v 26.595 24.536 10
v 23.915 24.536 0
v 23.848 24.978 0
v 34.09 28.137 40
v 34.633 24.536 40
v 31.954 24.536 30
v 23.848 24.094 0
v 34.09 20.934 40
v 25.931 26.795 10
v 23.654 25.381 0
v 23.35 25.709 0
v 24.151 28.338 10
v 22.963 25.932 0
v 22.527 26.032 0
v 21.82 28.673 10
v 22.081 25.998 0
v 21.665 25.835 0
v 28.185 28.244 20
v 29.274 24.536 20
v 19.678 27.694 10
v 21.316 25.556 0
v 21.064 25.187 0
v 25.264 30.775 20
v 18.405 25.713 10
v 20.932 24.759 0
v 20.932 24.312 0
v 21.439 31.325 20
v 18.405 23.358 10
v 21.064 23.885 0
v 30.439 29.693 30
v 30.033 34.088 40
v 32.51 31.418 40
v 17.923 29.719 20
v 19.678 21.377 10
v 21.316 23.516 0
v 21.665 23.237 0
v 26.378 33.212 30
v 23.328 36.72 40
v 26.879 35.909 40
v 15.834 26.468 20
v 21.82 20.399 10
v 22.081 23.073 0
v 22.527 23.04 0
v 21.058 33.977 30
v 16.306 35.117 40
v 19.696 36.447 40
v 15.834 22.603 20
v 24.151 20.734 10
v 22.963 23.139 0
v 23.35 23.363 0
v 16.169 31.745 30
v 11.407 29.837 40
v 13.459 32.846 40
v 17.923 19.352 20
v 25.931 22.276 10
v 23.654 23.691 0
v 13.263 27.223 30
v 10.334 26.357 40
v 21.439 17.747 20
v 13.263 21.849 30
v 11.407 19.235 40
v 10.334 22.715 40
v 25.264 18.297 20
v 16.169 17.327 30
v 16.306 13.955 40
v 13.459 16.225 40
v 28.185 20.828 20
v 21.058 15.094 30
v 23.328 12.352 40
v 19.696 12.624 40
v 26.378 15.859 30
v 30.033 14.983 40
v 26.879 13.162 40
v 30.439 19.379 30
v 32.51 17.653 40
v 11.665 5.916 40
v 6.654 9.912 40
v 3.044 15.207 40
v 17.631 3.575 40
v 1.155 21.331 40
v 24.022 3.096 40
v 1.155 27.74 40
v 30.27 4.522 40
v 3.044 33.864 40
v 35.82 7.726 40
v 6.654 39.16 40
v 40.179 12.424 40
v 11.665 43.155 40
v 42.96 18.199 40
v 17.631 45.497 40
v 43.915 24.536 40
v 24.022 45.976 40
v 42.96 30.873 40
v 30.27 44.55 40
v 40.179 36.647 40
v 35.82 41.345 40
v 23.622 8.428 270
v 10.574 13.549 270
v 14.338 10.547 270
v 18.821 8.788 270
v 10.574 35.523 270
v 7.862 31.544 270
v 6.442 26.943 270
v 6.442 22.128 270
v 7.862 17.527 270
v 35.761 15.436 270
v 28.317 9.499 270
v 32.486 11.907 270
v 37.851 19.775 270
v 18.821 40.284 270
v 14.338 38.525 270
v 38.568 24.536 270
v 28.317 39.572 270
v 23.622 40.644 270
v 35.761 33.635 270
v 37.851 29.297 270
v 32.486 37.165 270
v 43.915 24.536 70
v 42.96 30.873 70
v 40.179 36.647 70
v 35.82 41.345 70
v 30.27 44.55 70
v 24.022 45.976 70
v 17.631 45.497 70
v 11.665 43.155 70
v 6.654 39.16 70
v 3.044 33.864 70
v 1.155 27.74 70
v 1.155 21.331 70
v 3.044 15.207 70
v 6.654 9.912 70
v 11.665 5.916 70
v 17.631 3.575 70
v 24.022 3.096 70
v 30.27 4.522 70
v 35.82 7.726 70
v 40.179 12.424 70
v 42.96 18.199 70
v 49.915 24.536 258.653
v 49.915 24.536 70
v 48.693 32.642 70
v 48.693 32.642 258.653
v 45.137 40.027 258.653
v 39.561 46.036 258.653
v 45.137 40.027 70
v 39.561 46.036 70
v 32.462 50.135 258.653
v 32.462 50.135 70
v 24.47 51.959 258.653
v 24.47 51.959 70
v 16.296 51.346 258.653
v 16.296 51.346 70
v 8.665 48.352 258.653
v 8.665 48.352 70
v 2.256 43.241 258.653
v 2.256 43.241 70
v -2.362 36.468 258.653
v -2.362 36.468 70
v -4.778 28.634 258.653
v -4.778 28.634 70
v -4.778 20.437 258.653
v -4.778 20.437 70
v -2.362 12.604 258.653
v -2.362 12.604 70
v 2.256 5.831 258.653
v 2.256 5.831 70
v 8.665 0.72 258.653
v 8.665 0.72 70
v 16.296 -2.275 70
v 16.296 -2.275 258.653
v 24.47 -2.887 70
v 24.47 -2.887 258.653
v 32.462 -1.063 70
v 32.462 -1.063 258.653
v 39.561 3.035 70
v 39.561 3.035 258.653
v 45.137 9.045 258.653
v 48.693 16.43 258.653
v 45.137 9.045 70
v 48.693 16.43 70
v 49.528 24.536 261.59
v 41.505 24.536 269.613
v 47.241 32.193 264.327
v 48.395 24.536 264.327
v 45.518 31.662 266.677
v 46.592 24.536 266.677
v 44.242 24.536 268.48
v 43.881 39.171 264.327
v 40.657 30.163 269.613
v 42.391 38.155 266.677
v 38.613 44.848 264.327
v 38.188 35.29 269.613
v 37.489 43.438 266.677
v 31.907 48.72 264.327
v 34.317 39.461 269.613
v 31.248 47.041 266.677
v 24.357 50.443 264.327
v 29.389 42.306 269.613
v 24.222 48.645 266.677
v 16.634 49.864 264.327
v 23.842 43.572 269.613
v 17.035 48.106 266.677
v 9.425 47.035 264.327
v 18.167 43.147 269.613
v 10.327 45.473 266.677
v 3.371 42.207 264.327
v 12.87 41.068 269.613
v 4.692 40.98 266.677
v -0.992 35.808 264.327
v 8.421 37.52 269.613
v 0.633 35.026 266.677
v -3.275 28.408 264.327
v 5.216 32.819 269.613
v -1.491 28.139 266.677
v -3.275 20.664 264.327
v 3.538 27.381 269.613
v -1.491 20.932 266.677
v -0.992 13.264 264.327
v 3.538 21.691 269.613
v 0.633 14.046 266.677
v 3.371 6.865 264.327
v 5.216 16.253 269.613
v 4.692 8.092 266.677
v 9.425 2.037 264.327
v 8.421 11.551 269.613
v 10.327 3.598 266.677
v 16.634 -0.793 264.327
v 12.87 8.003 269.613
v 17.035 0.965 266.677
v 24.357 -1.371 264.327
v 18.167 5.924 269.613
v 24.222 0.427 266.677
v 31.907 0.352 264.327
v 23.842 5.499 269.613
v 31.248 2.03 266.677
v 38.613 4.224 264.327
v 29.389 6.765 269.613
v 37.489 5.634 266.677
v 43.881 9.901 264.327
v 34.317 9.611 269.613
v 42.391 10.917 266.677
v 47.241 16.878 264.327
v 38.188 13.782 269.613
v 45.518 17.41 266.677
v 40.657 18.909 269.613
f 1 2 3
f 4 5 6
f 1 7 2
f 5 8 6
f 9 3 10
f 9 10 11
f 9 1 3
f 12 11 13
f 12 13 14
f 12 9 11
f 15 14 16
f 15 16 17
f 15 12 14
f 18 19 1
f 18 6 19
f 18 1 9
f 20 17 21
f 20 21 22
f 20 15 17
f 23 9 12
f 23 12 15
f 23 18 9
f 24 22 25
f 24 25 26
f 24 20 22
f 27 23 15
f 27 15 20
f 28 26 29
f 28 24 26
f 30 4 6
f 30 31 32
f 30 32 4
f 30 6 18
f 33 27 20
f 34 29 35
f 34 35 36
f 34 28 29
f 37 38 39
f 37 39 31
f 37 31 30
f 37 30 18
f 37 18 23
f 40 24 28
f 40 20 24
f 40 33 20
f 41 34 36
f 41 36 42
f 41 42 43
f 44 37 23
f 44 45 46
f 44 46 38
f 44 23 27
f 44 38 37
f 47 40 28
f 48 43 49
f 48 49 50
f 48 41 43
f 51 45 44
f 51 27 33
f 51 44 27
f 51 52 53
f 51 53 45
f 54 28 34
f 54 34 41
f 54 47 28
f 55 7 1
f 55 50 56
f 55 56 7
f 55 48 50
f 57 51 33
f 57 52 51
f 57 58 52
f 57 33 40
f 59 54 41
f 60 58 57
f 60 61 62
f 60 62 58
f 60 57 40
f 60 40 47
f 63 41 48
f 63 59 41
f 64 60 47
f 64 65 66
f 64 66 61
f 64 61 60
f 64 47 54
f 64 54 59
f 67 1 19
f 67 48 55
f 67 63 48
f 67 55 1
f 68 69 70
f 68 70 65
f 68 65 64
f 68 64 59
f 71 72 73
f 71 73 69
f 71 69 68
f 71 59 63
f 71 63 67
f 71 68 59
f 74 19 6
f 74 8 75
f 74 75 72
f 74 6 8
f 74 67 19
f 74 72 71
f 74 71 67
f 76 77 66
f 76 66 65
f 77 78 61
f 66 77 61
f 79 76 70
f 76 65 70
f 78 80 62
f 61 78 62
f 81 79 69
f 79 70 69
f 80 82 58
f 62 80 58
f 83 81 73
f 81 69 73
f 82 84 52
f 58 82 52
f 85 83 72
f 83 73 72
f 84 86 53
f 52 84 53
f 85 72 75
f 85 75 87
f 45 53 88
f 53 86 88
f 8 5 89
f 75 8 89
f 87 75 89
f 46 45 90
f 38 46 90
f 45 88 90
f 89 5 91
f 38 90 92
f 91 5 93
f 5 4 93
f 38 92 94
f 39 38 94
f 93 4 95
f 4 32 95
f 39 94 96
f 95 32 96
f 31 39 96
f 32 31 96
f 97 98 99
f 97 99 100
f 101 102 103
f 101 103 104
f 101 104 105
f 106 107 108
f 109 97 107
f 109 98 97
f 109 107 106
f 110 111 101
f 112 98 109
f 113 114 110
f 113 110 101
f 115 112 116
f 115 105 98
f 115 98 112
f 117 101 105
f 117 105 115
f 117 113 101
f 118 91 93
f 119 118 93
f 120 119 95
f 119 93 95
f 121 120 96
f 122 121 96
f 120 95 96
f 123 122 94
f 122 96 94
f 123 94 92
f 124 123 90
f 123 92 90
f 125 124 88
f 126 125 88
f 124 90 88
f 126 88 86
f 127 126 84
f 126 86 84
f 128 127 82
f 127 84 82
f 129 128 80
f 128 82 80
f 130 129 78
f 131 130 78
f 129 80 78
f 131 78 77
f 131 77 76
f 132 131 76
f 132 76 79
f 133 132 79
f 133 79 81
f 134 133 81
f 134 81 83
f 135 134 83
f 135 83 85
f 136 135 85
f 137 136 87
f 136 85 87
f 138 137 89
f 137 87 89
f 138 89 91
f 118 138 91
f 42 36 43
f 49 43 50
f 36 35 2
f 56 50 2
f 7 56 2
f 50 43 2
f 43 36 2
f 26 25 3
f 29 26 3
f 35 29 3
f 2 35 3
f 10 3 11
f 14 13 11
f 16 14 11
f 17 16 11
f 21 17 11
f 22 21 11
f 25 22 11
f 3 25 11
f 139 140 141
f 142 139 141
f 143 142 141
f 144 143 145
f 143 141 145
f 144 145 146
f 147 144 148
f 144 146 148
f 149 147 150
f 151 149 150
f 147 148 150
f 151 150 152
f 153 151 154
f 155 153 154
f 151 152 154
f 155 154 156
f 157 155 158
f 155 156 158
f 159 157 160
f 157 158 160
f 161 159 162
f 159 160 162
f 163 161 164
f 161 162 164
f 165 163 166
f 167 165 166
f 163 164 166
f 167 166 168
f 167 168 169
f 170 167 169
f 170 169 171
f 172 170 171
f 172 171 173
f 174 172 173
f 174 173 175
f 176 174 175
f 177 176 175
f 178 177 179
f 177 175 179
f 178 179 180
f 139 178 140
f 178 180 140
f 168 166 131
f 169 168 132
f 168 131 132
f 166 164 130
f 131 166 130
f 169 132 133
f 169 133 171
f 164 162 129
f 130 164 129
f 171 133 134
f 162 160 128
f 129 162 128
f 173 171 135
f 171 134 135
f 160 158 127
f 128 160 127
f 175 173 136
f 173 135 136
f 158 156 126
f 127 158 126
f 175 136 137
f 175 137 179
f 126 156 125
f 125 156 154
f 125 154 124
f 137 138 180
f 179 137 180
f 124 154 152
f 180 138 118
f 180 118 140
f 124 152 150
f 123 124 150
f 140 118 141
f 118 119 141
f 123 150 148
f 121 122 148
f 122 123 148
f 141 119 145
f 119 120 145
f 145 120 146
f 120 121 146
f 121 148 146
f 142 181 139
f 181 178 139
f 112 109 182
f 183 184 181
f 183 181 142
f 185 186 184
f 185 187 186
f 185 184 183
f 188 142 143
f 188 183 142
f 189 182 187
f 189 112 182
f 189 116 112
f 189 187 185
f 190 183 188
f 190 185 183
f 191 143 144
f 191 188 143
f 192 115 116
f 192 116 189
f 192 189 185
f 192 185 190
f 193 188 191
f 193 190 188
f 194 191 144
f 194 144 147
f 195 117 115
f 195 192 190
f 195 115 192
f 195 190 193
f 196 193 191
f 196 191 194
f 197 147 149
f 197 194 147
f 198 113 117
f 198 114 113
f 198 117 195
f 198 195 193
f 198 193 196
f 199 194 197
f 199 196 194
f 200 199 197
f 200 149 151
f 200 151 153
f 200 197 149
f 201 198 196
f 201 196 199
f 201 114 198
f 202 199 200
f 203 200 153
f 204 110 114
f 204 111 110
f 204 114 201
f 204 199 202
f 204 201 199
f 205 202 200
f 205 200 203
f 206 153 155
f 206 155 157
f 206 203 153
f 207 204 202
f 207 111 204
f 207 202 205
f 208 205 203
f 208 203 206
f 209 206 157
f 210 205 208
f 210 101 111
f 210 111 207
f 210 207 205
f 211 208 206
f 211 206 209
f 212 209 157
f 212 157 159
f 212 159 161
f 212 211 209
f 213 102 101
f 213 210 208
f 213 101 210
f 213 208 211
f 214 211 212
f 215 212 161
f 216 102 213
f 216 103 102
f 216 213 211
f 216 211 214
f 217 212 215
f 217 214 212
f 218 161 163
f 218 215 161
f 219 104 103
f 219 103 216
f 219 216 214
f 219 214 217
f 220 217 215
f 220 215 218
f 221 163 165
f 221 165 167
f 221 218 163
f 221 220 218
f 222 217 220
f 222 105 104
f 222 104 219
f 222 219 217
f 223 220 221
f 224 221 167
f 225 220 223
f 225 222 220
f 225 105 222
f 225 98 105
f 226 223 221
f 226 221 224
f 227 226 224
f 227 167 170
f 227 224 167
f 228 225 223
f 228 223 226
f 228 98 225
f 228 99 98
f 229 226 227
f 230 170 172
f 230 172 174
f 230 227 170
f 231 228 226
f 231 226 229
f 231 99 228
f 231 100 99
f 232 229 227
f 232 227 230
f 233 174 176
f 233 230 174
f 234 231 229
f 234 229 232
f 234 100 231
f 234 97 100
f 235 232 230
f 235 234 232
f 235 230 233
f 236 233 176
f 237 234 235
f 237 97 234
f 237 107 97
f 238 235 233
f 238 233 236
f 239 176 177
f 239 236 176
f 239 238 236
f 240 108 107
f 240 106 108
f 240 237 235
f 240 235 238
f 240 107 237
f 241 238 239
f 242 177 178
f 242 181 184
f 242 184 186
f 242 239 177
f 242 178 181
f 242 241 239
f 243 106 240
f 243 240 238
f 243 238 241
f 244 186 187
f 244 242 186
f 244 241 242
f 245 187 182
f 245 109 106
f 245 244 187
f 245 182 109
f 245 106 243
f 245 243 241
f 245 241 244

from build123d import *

# Parameters (mm, degrees)
F1_START = 70
F0_R     = 27.5
F0_R_2   = 21.5
F0_R_3   = 1.5
F1_DEPTH = 200
F2_START = 40
F2_DEPTH = 30
F3_DEPTH = 40
F3_TAPER = -15
F4_R     = 11.3468037432


with BuildPart() as f1:
    # F0 (on Top) → F1 (new body)
    with BuildSketch(Plane.XY.offset(F1_START)):
        with Locations((22.4150829017, 24.535804987)):
            Circle(F0_R)
        with Locations((22.4150829017, 24.535804987)):
            Circle(F0_R_2, mode=Mode.SUBTRACT)
        with Locations((22.4150829017, 24.535804987)):
            Circle(F0_R_2)
        with Locations((22.4150829017, 24.535804987)):
            Circle(F0_R_3, mode=Mode.SUBTRACT)
        with Locations((22.4150829017, 24.535804987)):
            Circle(F0_R_3)
    extrude(amount=F1_DEPTH)

    # F0 (on Top) → F2 (join)
    with BuildSketch(Plane.XY.offset(F2_START)):
        with Locations((22.4150829017, 24.535804987)):
            Circle(F0_R_2)
        with Locations((22.4150829017, 24.535804987)):
            Circle(F0_R_3, mode=Mode.SUBTRACT)
        with Locations((22.4150829017, 24.535804987)):
            Circle(F0_R_3)
    extrude(amount=F2_DEPTH)

    # F0 (on Top) → F3 (join)
    with BuildSketch(Plane.XY):
        with Locations((22.4150829017, 24.535804987)):
            Circle(F0_R_3)
    extrude(amount=F3_DEPTH, taper=F3_TAPER)

    # F4
    f4_edges = [f1.edges().sort_by_distance(p)[0] for p in [
        (-5.084917, 24.535805, 270),
    ]]
    fillet(f4_edges, radius=F4_R)


solid = f1.part
